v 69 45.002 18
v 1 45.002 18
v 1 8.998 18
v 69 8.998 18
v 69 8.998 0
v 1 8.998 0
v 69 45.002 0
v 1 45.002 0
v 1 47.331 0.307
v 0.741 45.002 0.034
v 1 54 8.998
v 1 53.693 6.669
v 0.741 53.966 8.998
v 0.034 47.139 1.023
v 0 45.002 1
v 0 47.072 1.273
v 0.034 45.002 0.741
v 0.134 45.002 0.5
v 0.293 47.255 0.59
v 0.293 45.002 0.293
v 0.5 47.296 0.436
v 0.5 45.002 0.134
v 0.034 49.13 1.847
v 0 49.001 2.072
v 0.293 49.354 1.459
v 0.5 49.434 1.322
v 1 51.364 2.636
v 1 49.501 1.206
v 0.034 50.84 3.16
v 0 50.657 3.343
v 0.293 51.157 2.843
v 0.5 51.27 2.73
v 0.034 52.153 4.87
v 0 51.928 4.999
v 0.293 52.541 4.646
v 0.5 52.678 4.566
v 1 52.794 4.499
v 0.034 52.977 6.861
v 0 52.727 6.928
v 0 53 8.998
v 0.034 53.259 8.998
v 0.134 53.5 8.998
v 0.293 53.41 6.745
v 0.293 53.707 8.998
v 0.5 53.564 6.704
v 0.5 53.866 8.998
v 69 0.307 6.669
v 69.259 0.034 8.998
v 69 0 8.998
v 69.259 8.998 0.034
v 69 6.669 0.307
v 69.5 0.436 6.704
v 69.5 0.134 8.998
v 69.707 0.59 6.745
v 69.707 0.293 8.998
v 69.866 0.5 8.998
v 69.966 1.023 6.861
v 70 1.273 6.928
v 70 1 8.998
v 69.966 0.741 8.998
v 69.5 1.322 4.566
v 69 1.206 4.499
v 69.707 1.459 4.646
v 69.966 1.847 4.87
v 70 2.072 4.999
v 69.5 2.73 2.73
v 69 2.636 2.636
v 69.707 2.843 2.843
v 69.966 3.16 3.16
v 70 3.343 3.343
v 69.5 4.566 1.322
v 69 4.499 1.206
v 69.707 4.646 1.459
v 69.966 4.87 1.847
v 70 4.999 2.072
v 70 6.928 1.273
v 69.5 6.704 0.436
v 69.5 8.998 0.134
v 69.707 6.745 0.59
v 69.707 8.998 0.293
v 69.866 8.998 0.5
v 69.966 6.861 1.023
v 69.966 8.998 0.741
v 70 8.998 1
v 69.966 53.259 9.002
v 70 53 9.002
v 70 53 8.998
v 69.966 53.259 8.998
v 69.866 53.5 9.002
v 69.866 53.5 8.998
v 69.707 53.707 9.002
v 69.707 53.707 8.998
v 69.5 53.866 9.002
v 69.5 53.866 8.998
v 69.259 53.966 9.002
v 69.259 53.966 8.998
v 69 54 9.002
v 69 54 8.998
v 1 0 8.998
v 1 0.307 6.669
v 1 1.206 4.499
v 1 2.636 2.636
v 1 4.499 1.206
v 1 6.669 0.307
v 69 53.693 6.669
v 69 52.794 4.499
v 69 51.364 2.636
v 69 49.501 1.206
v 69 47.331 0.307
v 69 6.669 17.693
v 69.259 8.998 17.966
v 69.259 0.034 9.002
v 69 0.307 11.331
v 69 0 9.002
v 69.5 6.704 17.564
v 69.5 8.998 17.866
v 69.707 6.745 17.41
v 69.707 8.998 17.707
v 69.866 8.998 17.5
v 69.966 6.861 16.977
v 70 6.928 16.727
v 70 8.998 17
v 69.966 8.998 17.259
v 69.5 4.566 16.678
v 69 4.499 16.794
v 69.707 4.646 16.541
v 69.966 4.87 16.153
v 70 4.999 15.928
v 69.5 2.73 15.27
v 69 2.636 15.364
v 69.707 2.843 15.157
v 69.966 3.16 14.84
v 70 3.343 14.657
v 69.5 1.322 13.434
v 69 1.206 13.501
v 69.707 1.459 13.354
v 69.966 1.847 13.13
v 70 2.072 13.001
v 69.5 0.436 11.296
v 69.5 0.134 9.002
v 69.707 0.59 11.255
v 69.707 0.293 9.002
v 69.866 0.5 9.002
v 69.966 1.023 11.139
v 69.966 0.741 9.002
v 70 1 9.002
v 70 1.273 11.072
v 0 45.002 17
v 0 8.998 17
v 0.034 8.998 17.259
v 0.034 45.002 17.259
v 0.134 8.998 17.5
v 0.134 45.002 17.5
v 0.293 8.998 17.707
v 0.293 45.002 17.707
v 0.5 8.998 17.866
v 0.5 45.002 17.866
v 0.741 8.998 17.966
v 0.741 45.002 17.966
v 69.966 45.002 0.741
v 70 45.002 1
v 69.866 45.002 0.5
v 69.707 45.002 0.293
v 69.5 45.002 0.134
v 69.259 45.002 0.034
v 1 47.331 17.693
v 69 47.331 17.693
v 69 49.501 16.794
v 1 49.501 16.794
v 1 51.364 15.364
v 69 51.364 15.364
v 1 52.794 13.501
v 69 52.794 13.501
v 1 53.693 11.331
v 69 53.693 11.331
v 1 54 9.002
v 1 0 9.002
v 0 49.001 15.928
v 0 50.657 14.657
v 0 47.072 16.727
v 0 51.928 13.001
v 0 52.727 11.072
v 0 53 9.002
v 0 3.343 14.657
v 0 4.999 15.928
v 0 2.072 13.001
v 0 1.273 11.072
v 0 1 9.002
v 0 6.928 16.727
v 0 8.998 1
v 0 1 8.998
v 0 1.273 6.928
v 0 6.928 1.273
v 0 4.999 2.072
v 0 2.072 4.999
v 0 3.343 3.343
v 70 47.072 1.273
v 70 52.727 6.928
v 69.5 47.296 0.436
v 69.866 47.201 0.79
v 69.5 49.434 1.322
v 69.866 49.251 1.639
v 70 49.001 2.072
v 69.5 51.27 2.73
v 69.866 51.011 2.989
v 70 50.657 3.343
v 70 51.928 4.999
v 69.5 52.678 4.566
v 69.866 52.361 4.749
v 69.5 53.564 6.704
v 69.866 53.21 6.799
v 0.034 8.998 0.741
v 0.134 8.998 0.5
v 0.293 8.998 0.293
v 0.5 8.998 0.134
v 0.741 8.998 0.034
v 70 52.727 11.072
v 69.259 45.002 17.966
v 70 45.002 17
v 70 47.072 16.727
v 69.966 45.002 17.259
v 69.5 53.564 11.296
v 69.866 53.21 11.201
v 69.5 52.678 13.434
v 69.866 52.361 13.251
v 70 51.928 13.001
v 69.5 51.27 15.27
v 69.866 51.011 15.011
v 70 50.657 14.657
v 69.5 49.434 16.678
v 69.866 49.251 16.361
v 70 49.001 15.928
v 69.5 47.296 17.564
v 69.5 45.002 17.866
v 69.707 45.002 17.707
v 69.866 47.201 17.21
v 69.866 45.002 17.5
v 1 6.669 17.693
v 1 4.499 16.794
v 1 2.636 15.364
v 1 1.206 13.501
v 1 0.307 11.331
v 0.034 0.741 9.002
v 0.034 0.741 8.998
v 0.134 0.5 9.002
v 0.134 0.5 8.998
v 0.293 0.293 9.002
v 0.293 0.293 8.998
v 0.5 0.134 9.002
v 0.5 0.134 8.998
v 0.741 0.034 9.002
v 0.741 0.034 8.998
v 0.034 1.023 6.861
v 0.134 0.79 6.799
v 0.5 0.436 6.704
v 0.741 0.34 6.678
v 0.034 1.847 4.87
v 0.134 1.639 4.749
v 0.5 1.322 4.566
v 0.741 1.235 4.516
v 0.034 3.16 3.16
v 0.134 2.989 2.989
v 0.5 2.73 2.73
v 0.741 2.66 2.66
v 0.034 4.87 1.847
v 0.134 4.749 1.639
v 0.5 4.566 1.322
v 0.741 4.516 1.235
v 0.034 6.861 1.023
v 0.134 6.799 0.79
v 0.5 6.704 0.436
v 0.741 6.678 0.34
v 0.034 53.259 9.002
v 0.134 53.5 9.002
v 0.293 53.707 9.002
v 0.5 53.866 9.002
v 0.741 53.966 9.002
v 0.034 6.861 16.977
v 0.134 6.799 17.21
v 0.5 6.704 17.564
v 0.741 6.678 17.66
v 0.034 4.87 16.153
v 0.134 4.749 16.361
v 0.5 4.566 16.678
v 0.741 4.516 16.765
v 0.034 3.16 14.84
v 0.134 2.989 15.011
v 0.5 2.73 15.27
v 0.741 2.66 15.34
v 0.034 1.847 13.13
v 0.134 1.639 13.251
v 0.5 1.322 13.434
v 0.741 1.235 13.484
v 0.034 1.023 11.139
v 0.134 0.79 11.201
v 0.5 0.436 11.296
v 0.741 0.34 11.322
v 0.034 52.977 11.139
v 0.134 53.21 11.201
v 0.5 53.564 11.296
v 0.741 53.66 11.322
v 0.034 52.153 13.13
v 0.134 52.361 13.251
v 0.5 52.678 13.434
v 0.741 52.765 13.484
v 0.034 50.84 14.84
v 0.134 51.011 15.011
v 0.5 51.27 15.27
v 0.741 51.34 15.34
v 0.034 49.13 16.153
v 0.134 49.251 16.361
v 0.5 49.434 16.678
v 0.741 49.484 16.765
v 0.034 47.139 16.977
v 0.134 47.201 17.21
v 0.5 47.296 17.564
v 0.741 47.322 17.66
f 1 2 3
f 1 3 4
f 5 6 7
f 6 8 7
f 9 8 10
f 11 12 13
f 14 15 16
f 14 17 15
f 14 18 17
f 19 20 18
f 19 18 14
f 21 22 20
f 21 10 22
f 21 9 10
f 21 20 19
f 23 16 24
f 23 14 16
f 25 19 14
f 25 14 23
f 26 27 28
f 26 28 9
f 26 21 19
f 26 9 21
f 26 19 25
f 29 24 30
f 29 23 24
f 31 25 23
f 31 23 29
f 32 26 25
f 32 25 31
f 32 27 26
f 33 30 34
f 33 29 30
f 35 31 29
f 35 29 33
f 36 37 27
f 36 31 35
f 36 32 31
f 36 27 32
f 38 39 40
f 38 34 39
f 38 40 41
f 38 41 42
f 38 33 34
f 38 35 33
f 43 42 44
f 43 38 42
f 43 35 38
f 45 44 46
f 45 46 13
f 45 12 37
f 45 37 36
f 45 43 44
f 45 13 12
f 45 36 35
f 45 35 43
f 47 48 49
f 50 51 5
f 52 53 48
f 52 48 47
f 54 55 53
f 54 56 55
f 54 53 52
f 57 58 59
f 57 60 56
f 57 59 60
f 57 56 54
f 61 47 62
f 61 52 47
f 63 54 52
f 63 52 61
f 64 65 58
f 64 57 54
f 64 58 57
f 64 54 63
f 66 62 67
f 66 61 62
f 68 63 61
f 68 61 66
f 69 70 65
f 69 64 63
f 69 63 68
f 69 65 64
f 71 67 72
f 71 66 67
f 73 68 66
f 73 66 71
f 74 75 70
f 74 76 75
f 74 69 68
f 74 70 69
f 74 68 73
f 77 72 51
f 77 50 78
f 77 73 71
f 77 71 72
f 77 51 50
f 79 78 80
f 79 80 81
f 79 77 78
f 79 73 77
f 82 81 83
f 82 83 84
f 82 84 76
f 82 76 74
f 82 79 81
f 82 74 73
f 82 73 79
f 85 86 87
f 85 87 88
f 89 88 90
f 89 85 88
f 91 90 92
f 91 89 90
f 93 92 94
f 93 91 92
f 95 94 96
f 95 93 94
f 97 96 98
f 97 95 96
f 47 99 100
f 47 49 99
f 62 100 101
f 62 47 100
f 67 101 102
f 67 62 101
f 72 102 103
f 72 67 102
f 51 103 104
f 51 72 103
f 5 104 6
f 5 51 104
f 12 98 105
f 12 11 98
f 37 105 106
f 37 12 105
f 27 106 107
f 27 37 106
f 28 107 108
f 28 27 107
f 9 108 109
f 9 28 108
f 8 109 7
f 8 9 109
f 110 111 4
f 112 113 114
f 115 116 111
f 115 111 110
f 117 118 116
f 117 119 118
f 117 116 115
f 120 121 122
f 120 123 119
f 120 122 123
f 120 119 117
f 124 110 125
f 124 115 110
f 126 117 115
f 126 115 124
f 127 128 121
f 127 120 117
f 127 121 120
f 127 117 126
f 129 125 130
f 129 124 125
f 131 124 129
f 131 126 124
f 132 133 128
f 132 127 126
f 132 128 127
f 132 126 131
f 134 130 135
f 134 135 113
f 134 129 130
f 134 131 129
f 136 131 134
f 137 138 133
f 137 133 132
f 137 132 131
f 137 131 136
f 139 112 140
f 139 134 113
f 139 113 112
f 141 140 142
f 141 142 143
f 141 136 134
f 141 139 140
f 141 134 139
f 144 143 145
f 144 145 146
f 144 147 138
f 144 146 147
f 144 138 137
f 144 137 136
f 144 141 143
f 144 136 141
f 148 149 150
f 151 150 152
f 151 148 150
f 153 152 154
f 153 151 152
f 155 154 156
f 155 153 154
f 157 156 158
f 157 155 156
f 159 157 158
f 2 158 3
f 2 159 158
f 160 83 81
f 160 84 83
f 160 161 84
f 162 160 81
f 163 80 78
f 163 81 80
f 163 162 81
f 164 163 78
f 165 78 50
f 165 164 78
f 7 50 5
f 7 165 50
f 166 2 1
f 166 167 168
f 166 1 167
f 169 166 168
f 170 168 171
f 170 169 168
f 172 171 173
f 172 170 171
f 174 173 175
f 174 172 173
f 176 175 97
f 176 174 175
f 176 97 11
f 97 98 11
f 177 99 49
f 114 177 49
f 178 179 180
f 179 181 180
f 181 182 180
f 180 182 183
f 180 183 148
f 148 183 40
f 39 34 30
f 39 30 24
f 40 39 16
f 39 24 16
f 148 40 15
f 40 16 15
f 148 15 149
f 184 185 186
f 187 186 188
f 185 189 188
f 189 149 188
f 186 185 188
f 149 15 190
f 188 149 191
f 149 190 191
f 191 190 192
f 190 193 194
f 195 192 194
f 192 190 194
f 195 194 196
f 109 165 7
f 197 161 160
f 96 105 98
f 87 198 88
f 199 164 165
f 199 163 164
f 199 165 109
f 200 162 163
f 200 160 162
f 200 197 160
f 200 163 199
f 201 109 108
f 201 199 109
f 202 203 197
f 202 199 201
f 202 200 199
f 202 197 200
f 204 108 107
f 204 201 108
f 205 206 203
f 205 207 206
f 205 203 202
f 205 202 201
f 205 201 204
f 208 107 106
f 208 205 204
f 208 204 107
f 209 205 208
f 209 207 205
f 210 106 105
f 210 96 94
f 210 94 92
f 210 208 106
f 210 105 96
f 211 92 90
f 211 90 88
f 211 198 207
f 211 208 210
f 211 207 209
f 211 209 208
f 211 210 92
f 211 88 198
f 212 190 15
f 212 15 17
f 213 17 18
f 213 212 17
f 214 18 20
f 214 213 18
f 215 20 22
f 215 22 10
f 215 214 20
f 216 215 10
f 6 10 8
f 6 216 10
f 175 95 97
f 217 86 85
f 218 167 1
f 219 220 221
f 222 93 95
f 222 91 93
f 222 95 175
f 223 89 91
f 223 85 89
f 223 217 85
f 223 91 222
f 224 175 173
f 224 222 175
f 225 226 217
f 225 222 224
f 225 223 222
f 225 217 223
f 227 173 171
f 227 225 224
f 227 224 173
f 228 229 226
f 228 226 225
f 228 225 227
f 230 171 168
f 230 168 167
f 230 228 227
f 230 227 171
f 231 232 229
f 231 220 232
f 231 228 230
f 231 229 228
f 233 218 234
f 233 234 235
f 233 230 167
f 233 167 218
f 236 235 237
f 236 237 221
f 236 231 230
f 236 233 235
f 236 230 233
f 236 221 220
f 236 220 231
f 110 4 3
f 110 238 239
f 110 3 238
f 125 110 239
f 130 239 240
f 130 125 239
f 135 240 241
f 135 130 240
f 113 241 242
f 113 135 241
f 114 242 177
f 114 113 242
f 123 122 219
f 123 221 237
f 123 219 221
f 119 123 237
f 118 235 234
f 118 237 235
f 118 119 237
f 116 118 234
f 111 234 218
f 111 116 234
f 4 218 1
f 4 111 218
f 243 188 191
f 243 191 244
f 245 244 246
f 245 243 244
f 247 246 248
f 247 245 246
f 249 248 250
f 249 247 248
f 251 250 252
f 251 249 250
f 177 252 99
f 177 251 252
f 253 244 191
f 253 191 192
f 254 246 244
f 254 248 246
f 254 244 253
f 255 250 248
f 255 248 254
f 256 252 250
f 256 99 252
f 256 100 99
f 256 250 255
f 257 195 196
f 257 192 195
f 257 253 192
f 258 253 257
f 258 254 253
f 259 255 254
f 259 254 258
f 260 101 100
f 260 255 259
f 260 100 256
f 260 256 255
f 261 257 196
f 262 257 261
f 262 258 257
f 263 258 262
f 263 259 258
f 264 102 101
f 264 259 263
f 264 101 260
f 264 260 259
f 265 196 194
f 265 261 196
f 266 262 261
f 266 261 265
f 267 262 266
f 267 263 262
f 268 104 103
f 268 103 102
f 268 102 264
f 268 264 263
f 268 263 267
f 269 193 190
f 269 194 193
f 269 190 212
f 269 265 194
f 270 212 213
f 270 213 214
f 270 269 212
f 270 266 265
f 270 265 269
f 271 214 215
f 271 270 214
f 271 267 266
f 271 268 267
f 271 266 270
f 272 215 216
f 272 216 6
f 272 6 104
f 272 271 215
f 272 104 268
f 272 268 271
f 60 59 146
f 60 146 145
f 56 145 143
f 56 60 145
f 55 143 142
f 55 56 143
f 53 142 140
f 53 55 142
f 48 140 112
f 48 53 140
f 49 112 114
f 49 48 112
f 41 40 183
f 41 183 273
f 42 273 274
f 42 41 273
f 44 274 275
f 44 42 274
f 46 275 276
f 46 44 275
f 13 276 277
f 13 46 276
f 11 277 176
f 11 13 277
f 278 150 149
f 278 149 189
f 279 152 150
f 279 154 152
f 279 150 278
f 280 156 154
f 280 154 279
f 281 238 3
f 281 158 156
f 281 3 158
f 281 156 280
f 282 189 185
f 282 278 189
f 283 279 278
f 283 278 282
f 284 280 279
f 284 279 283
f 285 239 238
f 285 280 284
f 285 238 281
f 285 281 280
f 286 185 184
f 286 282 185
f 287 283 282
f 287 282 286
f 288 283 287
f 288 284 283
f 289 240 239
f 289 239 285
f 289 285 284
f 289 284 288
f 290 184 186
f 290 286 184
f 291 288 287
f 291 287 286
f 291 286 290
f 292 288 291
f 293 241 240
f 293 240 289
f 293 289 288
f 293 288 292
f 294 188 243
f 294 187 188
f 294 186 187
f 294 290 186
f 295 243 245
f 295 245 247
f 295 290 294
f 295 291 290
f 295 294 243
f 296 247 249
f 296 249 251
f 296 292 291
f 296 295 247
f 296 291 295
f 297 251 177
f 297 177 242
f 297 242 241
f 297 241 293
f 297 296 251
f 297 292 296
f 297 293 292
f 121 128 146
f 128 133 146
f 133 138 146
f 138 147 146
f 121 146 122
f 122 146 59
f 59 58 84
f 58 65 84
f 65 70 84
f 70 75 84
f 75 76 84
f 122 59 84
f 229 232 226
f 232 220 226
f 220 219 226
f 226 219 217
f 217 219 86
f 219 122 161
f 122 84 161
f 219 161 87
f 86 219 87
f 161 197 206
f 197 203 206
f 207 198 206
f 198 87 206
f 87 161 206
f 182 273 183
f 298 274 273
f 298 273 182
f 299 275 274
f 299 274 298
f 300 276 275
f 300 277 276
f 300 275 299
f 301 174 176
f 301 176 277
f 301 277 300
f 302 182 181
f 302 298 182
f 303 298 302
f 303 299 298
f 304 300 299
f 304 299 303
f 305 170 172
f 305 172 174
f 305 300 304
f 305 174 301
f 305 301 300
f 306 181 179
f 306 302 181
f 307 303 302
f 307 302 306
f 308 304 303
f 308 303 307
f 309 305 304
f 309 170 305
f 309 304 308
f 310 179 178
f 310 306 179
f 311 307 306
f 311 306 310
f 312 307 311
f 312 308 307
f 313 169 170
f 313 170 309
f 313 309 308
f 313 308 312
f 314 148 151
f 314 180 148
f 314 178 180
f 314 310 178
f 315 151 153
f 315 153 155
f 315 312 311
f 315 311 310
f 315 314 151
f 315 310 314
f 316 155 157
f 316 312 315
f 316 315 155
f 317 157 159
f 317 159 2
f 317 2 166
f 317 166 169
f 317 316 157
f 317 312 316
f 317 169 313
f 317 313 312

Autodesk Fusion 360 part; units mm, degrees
sketch "Sketch2" plane through (0, 0, 0) normal (0, 0, 1) x (1, 0, 0)
  line L0 (0, 0) -> (70, 0)
  line L1 (70, 0) -> (70, 54)
  line L2 (70, 54) -> (0, 54)
  line L3 (0, 54) -> (0, 0)
  dimension "d72" = 70
  dimension "d73" = 54
extrude "Extrude1" add sketch "Sketch2" along normal blind 18
fillet "Fillet1" radius 9 4 edges at (35, 54, 18) (35, 54, 0) (35, 0, 18) (35, 0, 0)
fillet "Fillet2" radius 1 8 edges at (0, 27, 0) (0, 54, 9) (0, 27, 18) (0, 0, 9) (70, 27, 0) (70, 0, 9) (70, 27, 18) (70, 54, 9)
